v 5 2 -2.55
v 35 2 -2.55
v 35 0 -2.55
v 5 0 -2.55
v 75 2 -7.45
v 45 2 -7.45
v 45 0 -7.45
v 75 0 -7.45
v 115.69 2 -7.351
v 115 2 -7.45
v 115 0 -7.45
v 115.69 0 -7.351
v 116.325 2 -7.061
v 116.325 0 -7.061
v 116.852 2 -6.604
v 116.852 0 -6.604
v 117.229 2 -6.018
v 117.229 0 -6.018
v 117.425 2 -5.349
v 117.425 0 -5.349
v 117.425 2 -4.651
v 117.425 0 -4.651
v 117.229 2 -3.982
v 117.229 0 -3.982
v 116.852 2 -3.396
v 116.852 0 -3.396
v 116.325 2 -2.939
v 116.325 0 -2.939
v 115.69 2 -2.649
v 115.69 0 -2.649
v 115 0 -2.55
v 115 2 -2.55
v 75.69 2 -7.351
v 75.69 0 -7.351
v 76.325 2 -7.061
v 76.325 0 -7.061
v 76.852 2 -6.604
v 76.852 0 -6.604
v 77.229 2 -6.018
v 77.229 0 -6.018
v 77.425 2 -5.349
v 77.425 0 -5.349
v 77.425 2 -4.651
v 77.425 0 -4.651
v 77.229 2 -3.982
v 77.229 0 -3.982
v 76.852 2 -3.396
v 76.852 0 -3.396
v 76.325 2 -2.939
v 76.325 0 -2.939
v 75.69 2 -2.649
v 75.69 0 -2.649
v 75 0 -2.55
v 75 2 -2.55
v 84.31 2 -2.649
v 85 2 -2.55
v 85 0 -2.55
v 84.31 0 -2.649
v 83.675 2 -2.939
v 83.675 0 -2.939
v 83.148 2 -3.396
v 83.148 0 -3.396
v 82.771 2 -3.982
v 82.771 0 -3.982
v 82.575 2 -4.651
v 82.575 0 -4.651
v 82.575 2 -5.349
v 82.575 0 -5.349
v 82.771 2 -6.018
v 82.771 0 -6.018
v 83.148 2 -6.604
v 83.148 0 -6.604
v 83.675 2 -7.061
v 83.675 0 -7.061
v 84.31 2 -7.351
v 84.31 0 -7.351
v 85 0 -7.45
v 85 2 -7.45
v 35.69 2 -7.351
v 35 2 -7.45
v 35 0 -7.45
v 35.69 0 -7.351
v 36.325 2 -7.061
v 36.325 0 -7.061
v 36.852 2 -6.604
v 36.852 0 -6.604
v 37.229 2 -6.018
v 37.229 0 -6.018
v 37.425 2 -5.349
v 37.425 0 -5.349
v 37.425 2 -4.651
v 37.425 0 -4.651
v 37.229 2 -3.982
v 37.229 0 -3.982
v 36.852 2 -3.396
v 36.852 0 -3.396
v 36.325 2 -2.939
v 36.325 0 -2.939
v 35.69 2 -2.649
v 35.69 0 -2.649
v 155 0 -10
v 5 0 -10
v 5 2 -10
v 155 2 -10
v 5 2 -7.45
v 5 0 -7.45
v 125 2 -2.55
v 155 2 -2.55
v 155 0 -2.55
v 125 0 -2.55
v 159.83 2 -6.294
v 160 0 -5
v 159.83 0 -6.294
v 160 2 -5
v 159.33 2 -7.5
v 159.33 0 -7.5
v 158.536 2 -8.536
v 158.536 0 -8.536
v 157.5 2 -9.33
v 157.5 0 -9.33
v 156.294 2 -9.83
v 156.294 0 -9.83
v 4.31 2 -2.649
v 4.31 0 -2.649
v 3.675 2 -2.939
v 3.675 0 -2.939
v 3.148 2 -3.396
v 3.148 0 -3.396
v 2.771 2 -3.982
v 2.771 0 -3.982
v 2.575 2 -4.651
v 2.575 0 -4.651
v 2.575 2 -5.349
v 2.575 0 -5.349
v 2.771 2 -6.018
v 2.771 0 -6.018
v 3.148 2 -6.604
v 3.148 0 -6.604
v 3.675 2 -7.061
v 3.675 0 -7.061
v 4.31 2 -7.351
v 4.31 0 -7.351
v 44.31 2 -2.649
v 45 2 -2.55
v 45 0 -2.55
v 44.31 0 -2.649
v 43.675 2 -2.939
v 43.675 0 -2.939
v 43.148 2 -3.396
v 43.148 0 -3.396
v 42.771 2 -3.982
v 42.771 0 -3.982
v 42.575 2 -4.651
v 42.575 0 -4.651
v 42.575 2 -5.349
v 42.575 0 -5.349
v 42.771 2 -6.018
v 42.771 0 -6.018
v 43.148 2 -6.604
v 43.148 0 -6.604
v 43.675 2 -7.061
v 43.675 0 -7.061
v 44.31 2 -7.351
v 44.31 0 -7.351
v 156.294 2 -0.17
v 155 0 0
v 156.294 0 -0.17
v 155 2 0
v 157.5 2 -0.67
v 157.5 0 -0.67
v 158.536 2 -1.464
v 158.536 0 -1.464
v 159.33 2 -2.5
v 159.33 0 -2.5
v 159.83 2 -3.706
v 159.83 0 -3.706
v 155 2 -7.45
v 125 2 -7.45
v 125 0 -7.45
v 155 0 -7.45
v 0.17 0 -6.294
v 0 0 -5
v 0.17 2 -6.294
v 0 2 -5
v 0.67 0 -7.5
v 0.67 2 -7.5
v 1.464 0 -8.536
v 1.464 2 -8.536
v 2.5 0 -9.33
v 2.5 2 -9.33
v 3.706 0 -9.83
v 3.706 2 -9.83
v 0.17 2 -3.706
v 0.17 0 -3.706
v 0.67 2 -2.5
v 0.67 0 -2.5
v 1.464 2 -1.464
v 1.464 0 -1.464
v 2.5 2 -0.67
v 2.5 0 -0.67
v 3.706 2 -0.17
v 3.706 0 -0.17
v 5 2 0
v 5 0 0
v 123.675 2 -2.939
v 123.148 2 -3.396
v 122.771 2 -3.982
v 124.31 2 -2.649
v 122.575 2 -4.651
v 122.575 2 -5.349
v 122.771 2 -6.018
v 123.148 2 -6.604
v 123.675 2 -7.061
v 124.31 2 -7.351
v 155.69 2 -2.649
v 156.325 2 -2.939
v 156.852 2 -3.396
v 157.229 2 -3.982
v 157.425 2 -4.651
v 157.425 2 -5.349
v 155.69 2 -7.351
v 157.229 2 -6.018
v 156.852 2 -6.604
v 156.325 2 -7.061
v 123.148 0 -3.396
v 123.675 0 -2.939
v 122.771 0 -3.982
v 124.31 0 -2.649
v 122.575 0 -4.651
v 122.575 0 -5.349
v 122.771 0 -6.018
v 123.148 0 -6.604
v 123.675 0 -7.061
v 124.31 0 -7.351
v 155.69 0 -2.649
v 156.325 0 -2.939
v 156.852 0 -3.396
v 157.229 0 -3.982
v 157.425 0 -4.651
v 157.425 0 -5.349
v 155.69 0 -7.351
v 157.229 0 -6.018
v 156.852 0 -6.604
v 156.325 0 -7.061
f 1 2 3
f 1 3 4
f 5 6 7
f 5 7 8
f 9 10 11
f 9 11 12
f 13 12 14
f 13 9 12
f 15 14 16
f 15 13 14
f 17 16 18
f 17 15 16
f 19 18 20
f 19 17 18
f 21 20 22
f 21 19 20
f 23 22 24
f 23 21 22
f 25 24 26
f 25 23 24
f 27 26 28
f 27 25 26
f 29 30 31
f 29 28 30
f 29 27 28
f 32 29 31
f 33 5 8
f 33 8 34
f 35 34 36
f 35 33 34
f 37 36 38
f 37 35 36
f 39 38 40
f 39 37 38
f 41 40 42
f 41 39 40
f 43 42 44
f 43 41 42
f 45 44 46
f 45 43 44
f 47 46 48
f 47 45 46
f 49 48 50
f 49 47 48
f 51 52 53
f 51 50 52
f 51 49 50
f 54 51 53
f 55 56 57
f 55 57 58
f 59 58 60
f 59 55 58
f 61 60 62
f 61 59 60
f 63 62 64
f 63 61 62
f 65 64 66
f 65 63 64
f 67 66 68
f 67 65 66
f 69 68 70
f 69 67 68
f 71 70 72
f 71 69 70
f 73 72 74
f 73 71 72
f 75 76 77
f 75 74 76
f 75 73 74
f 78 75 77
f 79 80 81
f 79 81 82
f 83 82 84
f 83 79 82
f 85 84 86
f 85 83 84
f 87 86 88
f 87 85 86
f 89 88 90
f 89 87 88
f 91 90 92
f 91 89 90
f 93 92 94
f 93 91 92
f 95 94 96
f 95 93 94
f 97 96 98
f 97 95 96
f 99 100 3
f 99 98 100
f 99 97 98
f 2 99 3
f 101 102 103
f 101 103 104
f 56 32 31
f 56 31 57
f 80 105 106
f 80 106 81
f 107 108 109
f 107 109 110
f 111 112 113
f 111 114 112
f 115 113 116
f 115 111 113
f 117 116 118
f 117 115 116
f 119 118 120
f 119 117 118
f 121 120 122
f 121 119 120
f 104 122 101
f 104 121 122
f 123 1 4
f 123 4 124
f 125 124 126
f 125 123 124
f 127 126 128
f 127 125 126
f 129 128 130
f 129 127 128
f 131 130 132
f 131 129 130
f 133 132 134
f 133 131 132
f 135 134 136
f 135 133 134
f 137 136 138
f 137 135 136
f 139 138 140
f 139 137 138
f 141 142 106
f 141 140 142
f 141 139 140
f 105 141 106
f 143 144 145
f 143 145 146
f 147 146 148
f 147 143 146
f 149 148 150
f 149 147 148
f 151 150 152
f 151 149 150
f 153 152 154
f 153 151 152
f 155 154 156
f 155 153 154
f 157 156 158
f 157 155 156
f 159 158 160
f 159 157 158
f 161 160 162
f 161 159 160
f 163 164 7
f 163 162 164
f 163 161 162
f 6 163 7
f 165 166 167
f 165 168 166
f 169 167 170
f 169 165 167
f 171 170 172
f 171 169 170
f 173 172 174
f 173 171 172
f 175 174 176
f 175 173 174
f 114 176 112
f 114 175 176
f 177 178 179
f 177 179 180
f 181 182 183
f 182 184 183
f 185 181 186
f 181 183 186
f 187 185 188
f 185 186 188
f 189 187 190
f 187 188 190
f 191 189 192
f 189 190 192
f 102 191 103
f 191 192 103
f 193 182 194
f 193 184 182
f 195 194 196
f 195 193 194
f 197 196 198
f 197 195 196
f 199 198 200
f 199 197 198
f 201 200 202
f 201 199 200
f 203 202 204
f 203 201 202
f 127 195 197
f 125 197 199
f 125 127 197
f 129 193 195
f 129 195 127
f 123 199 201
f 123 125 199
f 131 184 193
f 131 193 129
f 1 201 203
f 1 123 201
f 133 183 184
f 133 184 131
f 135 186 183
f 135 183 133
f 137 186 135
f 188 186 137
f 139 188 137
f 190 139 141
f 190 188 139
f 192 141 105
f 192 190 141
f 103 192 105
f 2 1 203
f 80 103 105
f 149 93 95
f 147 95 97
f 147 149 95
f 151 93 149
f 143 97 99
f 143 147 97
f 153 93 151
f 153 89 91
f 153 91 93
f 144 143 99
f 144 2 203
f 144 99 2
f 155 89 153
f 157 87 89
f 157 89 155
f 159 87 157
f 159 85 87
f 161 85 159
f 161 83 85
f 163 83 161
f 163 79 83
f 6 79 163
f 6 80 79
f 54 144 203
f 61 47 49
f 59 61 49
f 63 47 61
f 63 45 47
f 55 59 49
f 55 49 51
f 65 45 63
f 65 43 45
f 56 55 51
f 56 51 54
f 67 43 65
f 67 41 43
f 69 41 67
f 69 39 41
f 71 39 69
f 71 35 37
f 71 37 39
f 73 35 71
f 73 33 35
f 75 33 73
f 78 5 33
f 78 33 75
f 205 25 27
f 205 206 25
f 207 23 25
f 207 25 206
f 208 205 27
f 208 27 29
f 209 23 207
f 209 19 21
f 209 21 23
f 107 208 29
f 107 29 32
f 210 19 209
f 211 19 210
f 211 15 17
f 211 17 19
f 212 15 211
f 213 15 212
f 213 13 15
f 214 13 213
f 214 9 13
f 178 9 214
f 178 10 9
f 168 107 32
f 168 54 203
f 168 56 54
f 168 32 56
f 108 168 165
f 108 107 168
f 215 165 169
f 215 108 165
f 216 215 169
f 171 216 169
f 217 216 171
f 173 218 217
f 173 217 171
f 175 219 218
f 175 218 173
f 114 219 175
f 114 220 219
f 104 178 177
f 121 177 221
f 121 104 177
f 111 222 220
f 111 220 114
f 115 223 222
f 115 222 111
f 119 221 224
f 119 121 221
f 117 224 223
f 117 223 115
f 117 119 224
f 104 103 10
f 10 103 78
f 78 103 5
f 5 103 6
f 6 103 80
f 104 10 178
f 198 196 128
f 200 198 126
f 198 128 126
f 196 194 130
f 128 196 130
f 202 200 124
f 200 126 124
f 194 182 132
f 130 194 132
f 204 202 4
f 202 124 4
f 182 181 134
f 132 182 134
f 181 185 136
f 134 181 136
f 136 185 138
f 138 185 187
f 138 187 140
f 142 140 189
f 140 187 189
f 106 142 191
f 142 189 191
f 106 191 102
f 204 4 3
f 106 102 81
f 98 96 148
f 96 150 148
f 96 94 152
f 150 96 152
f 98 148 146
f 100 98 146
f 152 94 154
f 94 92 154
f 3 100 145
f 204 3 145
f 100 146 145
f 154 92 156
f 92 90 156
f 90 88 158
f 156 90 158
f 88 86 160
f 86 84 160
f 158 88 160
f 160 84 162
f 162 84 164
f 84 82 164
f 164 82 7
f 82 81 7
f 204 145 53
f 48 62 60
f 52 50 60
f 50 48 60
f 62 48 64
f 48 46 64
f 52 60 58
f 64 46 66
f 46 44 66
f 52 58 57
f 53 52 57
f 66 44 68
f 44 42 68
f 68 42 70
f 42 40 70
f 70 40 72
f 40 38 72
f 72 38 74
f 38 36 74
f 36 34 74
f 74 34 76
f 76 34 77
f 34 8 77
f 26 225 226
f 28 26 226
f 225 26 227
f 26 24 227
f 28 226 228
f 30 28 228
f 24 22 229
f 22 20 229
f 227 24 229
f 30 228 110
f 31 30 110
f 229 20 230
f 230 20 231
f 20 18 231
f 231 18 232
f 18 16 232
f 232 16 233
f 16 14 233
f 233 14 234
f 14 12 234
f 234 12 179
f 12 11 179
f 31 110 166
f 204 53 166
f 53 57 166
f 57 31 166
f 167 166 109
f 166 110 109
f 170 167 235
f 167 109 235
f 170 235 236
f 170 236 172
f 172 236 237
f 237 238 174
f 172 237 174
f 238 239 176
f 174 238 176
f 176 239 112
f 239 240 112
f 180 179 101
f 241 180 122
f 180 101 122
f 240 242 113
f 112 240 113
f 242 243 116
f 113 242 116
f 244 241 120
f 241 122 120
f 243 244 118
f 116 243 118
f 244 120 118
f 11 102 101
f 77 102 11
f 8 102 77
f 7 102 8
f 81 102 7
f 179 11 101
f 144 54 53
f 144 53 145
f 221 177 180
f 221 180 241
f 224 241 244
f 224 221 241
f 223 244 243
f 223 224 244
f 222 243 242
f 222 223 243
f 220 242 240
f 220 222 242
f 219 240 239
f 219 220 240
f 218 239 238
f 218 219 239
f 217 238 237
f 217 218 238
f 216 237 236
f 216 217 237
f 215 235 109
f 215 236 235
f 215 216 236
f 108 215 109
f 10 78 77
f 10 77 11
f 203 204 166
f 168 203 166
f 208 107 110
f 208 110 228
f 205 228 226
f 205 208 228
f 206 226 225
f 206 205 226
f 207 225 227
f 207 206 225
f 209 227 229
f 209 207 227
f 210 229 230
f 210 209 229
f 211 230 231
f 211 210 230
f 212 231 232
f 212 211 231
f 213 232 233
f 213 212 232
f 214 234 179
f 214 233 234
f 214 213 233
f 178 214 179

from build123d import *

# Parameters (mm, degrees)
SKETCH_1_W          = 160
SKETCH_1_H          = 10
EXTRUDE_1_DEPTH     = 2
FILLET_1_R          = 5
CUT_EXTRUDE_1_DEPTH = 10


with BuildPart() as part:
    # 스케치1 → 보스-돌출1 (new body)
    with BuildSketch(Plane(origin=(0, 0, 0), x_dir=(1, 0, 0), z_dir=(0, 1, 0))):
        with Locations((80, 5)):
            Rectangle(SKETCH_1_W, SKETCH_1_H)
    extrude(amount=EXTRUDE_1_DEPTH)

    # 필렛1
    fillet_1_edges = [part.edges().sort_by_distance(p)[0] for p in [
        (0, 1, 0),
        (0, 1, -10),
        (160, 1, -10),
        (160, 1, 0),
    ]]
    fillet(fillet_1_edges, radius=FILLET_1_R - 0.0001)  # a hair under: the kernel refuses the full size

    # 스케치2 → 컷-돌출1 (cut)
    with BuildSketch(Plane(origin=(0, 2, 0), x_dir=(1, 0, 0), z_dir=(0, 1, 0))):
        with BuildLine():
            Line((5, 7.45), (35, 7.45))
            ThreePointArc((35, 7.45), (37.45, 5), (35, 2.55))
            Line((35, 2.55), (5, 2.55))
            ThreePointArc((5, 2.55), (2.55, 5), (5, 7.45))
        make_face()
        with BuildLine():
            Line((45, 7.45), (75, 7.45))
            ThreePointArc((75, 7.45), (77.45, 5), (75, 2.55))
            Line((75, 2.55), (45, 2.55))
            ThreePointArc((45, 2.55), (42.55, 5), (45, 7.45))
        make_face()
        with BuildLine():
            Line((85, 7.45), (115, 7.45))
            ThreePointArc((115, 7.45), (117.45, 5), (115, 2.55))
            Line((115, 2.55), (85, 2.55))
            ThreePointArc((85, 2.55), (82.55, 5), (85, 7.45))
        make_face()
        with BuildLine():
            Line((125, 7.45), (155, 7.45))
            ThreePointArc((155, 7.45), (157.45, 5), (155, 2.55))
            Line((155, 2.55), (125, 2.55))
            ThreePointArc((125, 2.55), (122.55, 5), (125, 7.45))
        make_face()
    extrude(amount=-CUT_EXTRUDE_1_DEPTH, mode=Mode.SUBTRACT)


solid = part.part
